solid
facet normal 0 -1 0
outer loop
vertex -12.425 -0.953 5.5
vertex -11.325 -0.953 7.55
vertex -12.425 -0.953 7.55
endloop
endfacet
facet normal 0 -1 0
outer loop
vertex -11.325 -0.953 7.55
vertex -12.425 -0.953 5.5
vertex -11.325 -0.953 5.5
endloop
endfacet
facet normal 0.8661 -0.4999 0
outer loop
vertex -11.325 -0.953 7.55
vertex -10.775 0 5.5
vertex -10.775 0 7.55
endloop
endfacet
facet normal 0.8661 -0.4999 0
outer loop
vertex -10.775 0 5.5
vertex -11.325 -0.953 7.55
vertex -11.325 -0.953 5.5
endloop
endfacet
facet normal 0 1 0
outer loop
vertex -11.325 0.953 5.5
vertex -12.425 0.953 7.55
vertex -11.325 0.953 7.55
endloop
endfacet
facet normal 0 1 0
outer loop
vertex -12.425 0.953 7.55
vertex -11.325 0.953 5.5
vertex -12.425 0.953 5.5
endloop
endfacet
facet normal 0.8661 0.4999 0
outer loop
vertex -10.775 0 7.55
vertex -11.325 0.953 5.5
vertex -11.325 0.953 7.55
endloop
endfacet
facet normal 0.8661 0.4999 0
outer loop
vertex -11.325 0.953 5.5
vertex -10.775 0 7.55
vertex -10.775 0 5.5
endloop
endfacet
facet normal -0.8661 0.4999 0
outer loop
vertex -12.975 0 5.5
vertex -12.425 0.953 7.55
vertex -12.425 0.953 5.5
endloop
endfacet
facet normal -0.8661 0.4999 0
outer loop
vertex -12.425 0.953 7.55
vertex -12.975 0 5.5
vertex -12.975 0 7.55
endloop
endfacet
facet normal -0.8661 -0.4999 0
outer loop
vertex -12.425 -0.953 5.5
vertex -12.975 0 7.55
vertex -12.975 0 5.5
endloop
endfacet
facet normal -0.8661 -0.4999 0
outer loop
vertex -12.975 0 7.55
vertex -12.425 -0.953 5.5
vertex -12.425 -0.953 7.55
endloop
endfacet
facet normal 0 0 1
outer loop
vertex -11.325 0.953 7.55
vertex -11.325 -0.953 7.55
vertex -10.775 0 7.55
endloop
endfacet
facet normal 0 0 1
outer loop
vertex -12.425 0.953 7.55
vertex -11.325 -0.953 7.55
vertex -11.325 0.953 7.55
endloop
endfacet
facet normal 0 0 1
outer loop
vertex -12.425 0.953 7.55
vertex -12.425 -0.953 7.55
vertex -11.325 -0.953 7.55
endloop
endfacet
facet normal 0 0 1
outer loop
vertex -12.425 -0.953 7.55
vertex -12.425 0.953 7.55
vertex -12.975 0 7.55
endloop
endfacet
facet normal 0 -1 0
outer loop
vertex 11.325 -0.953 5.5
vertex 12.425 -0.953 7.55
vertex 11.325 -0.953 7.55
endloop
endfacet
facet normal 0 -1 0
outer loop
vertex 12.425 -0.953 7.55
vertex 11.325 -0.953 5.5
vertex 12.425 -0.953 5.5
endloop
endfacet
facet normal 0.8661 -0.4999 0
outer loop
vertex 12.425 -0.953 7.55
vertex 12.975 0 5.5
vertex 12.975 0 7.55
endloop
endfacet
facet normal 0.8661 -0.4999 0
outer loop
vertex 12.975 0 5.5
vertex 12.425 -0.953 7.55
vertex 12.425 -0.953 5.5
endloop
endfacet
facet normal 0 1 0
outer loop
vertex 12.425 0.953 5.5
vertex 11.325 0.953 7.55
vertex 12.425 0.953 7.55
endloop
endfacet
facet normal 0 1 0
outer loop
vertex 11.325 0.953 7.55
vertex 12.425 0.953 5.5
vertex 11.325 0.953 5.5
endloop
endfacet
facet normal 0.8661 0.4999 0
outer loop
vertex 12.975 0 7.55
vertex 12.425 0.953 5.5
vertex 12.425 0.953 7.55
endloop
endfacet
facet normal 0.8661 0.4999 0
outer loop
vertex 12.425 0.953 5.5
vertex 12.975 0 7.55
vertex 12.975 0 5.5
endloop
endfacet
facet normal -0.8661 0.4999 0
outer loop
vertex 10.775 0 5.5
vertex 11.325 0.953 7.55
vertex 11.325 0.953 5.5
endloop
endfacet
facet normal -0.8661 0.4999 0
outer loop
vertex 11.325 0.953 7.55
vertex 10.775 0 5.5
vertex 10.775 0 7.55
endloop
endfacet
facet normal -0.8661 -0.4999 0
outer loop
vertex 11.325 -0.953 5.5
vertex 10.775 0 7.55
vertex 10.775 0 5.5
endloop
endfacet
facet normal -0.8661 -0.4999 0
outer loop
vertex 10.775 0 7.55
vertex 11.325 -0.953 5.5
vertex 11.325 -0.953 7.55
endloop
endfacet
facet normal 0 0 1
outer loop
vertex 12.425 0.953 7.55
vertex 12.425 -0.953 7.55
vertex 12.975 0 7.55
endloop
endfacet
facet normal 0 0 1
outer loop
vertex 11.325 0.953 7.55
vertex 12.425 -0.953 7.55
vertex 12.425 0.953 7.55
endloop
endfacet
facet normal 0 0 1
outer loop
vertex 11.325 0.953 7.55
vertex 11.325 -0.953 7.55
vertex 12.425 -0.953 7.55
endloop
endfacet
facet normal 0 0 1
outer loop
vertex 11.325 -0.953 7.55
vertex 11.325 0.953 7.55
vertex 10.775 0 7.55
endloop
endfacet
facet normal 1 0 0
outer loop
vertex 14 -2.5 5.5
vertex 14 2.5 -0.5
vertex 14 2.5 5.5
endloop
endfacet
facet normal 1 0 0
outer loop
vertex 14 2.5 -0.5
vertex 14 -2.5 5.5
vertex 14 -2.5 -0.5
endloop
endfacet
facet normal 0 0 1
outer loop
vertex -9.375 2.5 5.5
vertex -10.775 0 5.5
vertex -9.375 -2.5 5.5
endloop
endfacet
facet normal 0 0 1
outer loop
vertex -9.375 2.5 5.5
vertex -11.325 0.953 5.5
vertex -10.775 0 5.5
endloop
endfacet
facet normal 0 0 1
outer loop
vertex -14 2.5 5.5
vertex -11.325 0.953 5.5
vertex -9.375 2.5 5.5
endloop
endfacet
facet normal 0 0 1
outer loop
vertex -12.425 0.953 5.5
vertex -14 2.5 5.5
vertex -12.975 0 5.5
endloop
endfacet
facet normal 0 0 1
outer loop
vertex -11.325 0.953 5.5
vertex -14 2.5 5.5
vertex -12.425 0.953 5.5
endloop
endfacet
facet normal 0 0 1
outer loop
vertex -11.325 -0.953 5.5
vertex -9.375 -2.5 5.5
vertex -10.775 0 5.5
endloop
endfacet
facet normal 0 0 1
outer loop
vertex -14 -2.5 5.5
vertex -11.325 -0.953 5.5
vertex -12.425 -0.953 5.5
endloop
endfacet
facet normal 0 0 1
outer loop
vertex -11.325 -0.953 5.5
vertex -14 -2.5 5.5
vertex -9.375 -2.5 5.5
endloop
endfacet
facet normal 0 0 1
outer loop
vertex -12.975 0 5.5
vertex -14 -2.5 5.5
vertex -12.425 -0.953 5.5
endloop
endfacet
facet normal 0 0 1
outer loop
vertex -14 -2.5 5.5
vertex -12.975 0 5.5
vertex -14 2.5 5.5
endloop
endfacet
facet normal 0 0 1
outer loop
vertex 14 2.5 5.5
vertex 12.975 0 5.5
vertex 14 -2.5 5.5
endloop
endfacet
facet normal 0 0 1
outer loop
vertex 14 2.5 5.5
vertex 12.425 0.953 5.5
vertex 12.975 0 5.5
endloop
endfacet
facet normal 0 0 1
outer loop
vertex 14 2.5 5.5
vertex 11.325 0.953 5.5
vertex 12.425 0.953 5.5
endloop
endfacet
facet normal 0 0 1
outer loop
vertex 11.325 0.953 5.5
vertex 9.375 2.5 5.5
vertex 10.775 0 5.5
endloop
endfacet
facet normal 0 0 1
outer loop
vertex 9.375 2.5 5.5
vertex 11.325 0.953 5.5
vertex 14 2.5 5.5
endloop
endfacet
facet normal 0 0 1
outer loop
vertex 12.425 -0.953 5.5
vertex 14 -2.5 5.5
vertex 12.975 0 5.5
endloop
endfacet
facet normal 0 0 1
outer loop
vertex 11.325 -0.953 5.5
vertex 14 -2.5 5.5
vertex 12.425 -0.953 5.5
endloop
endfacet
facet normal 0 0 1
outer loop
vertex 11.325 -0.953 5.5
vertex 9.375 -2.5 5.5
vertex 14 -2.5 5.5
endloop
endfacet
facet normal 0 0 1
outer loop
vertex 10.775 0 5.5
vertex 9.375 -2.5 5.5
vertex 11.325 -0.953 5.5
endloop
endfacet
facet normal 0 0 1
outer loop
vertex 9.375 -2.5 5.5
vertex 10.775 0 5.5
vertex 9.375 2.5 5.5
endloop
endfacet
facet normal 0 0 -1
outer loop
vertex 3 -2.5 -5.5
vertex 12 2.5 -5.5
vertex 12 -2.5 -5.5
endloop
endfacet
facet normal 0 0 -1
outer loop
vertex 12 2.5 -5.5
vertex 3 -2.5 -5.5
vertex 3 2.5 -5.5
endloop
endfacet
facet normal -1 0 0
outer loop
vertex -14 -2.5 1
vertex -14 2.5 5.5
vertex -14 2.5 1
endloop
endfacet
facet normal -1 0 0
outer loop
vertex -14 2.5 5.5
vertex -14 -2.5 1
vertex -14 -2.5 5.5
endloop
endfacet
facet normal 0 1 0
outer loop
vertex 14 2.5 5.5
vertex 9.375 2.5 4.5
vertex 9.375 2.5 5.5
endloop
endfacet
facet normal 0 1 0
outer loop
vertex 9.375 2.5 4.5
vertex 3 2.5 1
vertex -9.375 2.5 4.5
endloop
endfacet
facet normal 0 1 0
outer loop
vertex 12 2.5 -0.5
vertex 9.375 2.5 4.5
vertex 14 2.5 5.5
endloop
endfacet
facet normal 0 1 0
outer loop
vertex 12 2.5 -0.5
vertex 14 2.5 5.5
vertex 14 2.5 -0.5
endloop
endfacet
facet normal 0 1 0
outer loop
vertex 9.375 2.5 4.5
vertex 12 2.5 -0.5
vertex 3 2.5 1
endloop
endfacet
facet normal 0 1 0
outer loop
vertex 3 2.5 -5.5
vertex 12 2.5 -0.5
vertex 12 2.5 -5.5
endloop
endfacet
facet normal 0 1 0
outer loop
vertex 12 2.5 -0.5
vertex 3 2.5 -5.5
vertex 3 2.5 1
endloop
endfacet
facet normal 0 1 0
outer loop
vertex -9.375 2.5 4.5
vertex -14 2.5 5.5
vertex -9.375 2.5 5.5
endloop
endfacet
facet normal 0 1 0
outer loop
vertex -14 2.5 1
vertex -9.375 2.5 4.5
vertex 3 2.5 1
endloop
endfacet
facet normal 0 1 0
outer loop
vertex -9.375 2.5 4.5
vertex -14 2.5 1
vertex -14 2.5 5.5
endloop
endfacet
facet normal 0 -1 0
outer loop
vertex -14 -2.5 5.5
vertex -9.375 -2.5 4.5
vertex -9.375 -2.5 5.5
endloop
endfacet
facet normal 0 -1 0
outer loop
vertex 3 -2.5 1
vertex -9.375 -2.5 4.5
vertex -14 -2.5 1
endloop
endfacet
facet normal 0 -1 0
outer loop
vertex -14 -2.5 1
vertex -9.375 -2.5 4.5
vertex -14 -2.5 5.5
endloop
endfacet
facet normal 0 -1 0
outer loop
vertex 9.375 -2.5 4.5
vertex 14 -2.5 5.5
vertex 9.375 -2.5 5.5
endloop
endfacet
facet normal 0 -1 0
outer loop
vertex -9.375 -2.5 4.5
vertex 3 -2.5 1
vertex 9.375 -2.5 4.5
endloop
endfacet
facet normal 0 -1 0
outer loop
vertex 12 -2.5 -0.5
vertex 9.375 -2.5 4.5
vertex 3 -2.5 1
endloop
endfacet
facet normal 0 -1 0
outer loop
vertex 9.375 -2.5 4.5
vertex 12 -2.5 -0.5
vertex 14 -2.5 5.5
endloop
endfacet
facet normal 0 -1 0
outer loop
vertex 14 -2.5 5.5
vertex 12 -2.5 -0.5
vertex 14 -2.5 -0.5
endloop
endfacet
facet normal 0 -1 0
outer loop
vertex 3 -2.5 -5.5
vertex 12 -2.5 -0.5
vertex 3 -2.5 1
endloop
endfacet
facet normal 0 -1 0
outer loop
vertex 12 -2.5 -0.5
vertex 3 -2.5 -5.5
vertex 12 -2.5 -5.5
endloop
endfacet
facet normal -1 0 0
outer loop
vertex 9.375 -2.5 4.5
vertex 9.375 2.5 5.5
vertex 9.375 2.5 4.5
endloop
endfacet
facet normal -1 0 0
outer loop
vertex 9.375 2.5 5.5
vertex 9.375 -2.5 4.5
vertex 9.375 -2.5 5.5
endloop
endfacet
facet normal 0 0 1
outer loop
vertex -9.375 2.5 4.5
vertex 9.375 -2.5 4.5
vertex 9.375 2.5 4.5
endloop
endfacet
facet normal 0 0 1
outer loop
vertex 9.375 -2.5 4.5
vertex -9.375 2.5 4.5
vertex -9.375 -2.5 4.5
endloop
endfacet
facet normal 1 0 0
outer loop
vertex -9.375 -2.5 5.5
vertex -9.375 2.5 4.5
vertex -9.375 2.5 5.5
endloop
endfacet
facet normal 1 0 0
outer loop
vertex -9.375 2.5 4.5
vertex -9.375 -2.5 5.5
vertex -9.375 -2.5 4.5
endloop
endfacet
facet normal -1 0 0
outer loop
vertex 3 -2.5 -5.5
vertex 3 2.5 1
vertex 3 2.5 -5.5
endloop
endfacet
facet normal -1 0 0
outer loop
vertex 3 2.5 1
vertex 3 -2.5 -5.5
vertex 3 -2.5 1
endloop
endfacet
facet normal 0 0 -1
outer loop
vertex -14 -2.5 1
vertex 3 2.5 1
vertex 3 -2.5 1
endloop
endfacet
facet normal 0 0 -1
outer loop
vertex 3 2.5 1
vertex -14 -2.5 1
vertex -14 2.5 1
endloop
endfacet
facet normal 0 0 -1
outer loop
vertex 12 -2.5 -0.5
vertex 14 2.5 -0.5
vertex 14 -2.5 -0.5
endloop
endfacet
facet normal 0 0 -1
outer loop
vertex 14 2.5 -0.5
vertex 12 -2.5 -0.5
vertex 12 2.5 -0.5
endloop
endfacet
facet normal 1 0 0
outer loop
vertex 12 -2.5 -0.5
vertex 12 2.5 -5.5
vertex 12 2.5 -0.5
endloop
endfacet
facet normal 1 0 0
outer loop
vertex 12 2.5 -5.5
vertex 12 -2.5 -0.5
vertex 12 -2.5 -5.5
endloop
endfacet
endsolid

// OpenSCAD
body=[28,5,11.0];
hole_d=2.2;
hole_h=2.0;
hole_dist=23.75;

difference()
{
  union()
  {
    cube(body,center=true);
    // screw pins
    for(i=[-1:2:1])
      translate([hole_dist/2*i,0,body[2]/2+hole_h/2])
      cylinder(d=hole_d,h=hole_h+0.1,$fn=6,center=true);
  }
  // cut clearing for ribbon cable
  translate([0,0,body[2]/2])
    cube([hole_dist-5,10,2],center=true);
  // cut bottom stand
  // hdmi
  translate([-body[0]/2,0,-body[2]/2])
    cube([34,10,13],center=true);
  // audio jack
  translate([body[0]/2,0,-body[2]/2])
    cube([4,10,10],center=true);   
}
